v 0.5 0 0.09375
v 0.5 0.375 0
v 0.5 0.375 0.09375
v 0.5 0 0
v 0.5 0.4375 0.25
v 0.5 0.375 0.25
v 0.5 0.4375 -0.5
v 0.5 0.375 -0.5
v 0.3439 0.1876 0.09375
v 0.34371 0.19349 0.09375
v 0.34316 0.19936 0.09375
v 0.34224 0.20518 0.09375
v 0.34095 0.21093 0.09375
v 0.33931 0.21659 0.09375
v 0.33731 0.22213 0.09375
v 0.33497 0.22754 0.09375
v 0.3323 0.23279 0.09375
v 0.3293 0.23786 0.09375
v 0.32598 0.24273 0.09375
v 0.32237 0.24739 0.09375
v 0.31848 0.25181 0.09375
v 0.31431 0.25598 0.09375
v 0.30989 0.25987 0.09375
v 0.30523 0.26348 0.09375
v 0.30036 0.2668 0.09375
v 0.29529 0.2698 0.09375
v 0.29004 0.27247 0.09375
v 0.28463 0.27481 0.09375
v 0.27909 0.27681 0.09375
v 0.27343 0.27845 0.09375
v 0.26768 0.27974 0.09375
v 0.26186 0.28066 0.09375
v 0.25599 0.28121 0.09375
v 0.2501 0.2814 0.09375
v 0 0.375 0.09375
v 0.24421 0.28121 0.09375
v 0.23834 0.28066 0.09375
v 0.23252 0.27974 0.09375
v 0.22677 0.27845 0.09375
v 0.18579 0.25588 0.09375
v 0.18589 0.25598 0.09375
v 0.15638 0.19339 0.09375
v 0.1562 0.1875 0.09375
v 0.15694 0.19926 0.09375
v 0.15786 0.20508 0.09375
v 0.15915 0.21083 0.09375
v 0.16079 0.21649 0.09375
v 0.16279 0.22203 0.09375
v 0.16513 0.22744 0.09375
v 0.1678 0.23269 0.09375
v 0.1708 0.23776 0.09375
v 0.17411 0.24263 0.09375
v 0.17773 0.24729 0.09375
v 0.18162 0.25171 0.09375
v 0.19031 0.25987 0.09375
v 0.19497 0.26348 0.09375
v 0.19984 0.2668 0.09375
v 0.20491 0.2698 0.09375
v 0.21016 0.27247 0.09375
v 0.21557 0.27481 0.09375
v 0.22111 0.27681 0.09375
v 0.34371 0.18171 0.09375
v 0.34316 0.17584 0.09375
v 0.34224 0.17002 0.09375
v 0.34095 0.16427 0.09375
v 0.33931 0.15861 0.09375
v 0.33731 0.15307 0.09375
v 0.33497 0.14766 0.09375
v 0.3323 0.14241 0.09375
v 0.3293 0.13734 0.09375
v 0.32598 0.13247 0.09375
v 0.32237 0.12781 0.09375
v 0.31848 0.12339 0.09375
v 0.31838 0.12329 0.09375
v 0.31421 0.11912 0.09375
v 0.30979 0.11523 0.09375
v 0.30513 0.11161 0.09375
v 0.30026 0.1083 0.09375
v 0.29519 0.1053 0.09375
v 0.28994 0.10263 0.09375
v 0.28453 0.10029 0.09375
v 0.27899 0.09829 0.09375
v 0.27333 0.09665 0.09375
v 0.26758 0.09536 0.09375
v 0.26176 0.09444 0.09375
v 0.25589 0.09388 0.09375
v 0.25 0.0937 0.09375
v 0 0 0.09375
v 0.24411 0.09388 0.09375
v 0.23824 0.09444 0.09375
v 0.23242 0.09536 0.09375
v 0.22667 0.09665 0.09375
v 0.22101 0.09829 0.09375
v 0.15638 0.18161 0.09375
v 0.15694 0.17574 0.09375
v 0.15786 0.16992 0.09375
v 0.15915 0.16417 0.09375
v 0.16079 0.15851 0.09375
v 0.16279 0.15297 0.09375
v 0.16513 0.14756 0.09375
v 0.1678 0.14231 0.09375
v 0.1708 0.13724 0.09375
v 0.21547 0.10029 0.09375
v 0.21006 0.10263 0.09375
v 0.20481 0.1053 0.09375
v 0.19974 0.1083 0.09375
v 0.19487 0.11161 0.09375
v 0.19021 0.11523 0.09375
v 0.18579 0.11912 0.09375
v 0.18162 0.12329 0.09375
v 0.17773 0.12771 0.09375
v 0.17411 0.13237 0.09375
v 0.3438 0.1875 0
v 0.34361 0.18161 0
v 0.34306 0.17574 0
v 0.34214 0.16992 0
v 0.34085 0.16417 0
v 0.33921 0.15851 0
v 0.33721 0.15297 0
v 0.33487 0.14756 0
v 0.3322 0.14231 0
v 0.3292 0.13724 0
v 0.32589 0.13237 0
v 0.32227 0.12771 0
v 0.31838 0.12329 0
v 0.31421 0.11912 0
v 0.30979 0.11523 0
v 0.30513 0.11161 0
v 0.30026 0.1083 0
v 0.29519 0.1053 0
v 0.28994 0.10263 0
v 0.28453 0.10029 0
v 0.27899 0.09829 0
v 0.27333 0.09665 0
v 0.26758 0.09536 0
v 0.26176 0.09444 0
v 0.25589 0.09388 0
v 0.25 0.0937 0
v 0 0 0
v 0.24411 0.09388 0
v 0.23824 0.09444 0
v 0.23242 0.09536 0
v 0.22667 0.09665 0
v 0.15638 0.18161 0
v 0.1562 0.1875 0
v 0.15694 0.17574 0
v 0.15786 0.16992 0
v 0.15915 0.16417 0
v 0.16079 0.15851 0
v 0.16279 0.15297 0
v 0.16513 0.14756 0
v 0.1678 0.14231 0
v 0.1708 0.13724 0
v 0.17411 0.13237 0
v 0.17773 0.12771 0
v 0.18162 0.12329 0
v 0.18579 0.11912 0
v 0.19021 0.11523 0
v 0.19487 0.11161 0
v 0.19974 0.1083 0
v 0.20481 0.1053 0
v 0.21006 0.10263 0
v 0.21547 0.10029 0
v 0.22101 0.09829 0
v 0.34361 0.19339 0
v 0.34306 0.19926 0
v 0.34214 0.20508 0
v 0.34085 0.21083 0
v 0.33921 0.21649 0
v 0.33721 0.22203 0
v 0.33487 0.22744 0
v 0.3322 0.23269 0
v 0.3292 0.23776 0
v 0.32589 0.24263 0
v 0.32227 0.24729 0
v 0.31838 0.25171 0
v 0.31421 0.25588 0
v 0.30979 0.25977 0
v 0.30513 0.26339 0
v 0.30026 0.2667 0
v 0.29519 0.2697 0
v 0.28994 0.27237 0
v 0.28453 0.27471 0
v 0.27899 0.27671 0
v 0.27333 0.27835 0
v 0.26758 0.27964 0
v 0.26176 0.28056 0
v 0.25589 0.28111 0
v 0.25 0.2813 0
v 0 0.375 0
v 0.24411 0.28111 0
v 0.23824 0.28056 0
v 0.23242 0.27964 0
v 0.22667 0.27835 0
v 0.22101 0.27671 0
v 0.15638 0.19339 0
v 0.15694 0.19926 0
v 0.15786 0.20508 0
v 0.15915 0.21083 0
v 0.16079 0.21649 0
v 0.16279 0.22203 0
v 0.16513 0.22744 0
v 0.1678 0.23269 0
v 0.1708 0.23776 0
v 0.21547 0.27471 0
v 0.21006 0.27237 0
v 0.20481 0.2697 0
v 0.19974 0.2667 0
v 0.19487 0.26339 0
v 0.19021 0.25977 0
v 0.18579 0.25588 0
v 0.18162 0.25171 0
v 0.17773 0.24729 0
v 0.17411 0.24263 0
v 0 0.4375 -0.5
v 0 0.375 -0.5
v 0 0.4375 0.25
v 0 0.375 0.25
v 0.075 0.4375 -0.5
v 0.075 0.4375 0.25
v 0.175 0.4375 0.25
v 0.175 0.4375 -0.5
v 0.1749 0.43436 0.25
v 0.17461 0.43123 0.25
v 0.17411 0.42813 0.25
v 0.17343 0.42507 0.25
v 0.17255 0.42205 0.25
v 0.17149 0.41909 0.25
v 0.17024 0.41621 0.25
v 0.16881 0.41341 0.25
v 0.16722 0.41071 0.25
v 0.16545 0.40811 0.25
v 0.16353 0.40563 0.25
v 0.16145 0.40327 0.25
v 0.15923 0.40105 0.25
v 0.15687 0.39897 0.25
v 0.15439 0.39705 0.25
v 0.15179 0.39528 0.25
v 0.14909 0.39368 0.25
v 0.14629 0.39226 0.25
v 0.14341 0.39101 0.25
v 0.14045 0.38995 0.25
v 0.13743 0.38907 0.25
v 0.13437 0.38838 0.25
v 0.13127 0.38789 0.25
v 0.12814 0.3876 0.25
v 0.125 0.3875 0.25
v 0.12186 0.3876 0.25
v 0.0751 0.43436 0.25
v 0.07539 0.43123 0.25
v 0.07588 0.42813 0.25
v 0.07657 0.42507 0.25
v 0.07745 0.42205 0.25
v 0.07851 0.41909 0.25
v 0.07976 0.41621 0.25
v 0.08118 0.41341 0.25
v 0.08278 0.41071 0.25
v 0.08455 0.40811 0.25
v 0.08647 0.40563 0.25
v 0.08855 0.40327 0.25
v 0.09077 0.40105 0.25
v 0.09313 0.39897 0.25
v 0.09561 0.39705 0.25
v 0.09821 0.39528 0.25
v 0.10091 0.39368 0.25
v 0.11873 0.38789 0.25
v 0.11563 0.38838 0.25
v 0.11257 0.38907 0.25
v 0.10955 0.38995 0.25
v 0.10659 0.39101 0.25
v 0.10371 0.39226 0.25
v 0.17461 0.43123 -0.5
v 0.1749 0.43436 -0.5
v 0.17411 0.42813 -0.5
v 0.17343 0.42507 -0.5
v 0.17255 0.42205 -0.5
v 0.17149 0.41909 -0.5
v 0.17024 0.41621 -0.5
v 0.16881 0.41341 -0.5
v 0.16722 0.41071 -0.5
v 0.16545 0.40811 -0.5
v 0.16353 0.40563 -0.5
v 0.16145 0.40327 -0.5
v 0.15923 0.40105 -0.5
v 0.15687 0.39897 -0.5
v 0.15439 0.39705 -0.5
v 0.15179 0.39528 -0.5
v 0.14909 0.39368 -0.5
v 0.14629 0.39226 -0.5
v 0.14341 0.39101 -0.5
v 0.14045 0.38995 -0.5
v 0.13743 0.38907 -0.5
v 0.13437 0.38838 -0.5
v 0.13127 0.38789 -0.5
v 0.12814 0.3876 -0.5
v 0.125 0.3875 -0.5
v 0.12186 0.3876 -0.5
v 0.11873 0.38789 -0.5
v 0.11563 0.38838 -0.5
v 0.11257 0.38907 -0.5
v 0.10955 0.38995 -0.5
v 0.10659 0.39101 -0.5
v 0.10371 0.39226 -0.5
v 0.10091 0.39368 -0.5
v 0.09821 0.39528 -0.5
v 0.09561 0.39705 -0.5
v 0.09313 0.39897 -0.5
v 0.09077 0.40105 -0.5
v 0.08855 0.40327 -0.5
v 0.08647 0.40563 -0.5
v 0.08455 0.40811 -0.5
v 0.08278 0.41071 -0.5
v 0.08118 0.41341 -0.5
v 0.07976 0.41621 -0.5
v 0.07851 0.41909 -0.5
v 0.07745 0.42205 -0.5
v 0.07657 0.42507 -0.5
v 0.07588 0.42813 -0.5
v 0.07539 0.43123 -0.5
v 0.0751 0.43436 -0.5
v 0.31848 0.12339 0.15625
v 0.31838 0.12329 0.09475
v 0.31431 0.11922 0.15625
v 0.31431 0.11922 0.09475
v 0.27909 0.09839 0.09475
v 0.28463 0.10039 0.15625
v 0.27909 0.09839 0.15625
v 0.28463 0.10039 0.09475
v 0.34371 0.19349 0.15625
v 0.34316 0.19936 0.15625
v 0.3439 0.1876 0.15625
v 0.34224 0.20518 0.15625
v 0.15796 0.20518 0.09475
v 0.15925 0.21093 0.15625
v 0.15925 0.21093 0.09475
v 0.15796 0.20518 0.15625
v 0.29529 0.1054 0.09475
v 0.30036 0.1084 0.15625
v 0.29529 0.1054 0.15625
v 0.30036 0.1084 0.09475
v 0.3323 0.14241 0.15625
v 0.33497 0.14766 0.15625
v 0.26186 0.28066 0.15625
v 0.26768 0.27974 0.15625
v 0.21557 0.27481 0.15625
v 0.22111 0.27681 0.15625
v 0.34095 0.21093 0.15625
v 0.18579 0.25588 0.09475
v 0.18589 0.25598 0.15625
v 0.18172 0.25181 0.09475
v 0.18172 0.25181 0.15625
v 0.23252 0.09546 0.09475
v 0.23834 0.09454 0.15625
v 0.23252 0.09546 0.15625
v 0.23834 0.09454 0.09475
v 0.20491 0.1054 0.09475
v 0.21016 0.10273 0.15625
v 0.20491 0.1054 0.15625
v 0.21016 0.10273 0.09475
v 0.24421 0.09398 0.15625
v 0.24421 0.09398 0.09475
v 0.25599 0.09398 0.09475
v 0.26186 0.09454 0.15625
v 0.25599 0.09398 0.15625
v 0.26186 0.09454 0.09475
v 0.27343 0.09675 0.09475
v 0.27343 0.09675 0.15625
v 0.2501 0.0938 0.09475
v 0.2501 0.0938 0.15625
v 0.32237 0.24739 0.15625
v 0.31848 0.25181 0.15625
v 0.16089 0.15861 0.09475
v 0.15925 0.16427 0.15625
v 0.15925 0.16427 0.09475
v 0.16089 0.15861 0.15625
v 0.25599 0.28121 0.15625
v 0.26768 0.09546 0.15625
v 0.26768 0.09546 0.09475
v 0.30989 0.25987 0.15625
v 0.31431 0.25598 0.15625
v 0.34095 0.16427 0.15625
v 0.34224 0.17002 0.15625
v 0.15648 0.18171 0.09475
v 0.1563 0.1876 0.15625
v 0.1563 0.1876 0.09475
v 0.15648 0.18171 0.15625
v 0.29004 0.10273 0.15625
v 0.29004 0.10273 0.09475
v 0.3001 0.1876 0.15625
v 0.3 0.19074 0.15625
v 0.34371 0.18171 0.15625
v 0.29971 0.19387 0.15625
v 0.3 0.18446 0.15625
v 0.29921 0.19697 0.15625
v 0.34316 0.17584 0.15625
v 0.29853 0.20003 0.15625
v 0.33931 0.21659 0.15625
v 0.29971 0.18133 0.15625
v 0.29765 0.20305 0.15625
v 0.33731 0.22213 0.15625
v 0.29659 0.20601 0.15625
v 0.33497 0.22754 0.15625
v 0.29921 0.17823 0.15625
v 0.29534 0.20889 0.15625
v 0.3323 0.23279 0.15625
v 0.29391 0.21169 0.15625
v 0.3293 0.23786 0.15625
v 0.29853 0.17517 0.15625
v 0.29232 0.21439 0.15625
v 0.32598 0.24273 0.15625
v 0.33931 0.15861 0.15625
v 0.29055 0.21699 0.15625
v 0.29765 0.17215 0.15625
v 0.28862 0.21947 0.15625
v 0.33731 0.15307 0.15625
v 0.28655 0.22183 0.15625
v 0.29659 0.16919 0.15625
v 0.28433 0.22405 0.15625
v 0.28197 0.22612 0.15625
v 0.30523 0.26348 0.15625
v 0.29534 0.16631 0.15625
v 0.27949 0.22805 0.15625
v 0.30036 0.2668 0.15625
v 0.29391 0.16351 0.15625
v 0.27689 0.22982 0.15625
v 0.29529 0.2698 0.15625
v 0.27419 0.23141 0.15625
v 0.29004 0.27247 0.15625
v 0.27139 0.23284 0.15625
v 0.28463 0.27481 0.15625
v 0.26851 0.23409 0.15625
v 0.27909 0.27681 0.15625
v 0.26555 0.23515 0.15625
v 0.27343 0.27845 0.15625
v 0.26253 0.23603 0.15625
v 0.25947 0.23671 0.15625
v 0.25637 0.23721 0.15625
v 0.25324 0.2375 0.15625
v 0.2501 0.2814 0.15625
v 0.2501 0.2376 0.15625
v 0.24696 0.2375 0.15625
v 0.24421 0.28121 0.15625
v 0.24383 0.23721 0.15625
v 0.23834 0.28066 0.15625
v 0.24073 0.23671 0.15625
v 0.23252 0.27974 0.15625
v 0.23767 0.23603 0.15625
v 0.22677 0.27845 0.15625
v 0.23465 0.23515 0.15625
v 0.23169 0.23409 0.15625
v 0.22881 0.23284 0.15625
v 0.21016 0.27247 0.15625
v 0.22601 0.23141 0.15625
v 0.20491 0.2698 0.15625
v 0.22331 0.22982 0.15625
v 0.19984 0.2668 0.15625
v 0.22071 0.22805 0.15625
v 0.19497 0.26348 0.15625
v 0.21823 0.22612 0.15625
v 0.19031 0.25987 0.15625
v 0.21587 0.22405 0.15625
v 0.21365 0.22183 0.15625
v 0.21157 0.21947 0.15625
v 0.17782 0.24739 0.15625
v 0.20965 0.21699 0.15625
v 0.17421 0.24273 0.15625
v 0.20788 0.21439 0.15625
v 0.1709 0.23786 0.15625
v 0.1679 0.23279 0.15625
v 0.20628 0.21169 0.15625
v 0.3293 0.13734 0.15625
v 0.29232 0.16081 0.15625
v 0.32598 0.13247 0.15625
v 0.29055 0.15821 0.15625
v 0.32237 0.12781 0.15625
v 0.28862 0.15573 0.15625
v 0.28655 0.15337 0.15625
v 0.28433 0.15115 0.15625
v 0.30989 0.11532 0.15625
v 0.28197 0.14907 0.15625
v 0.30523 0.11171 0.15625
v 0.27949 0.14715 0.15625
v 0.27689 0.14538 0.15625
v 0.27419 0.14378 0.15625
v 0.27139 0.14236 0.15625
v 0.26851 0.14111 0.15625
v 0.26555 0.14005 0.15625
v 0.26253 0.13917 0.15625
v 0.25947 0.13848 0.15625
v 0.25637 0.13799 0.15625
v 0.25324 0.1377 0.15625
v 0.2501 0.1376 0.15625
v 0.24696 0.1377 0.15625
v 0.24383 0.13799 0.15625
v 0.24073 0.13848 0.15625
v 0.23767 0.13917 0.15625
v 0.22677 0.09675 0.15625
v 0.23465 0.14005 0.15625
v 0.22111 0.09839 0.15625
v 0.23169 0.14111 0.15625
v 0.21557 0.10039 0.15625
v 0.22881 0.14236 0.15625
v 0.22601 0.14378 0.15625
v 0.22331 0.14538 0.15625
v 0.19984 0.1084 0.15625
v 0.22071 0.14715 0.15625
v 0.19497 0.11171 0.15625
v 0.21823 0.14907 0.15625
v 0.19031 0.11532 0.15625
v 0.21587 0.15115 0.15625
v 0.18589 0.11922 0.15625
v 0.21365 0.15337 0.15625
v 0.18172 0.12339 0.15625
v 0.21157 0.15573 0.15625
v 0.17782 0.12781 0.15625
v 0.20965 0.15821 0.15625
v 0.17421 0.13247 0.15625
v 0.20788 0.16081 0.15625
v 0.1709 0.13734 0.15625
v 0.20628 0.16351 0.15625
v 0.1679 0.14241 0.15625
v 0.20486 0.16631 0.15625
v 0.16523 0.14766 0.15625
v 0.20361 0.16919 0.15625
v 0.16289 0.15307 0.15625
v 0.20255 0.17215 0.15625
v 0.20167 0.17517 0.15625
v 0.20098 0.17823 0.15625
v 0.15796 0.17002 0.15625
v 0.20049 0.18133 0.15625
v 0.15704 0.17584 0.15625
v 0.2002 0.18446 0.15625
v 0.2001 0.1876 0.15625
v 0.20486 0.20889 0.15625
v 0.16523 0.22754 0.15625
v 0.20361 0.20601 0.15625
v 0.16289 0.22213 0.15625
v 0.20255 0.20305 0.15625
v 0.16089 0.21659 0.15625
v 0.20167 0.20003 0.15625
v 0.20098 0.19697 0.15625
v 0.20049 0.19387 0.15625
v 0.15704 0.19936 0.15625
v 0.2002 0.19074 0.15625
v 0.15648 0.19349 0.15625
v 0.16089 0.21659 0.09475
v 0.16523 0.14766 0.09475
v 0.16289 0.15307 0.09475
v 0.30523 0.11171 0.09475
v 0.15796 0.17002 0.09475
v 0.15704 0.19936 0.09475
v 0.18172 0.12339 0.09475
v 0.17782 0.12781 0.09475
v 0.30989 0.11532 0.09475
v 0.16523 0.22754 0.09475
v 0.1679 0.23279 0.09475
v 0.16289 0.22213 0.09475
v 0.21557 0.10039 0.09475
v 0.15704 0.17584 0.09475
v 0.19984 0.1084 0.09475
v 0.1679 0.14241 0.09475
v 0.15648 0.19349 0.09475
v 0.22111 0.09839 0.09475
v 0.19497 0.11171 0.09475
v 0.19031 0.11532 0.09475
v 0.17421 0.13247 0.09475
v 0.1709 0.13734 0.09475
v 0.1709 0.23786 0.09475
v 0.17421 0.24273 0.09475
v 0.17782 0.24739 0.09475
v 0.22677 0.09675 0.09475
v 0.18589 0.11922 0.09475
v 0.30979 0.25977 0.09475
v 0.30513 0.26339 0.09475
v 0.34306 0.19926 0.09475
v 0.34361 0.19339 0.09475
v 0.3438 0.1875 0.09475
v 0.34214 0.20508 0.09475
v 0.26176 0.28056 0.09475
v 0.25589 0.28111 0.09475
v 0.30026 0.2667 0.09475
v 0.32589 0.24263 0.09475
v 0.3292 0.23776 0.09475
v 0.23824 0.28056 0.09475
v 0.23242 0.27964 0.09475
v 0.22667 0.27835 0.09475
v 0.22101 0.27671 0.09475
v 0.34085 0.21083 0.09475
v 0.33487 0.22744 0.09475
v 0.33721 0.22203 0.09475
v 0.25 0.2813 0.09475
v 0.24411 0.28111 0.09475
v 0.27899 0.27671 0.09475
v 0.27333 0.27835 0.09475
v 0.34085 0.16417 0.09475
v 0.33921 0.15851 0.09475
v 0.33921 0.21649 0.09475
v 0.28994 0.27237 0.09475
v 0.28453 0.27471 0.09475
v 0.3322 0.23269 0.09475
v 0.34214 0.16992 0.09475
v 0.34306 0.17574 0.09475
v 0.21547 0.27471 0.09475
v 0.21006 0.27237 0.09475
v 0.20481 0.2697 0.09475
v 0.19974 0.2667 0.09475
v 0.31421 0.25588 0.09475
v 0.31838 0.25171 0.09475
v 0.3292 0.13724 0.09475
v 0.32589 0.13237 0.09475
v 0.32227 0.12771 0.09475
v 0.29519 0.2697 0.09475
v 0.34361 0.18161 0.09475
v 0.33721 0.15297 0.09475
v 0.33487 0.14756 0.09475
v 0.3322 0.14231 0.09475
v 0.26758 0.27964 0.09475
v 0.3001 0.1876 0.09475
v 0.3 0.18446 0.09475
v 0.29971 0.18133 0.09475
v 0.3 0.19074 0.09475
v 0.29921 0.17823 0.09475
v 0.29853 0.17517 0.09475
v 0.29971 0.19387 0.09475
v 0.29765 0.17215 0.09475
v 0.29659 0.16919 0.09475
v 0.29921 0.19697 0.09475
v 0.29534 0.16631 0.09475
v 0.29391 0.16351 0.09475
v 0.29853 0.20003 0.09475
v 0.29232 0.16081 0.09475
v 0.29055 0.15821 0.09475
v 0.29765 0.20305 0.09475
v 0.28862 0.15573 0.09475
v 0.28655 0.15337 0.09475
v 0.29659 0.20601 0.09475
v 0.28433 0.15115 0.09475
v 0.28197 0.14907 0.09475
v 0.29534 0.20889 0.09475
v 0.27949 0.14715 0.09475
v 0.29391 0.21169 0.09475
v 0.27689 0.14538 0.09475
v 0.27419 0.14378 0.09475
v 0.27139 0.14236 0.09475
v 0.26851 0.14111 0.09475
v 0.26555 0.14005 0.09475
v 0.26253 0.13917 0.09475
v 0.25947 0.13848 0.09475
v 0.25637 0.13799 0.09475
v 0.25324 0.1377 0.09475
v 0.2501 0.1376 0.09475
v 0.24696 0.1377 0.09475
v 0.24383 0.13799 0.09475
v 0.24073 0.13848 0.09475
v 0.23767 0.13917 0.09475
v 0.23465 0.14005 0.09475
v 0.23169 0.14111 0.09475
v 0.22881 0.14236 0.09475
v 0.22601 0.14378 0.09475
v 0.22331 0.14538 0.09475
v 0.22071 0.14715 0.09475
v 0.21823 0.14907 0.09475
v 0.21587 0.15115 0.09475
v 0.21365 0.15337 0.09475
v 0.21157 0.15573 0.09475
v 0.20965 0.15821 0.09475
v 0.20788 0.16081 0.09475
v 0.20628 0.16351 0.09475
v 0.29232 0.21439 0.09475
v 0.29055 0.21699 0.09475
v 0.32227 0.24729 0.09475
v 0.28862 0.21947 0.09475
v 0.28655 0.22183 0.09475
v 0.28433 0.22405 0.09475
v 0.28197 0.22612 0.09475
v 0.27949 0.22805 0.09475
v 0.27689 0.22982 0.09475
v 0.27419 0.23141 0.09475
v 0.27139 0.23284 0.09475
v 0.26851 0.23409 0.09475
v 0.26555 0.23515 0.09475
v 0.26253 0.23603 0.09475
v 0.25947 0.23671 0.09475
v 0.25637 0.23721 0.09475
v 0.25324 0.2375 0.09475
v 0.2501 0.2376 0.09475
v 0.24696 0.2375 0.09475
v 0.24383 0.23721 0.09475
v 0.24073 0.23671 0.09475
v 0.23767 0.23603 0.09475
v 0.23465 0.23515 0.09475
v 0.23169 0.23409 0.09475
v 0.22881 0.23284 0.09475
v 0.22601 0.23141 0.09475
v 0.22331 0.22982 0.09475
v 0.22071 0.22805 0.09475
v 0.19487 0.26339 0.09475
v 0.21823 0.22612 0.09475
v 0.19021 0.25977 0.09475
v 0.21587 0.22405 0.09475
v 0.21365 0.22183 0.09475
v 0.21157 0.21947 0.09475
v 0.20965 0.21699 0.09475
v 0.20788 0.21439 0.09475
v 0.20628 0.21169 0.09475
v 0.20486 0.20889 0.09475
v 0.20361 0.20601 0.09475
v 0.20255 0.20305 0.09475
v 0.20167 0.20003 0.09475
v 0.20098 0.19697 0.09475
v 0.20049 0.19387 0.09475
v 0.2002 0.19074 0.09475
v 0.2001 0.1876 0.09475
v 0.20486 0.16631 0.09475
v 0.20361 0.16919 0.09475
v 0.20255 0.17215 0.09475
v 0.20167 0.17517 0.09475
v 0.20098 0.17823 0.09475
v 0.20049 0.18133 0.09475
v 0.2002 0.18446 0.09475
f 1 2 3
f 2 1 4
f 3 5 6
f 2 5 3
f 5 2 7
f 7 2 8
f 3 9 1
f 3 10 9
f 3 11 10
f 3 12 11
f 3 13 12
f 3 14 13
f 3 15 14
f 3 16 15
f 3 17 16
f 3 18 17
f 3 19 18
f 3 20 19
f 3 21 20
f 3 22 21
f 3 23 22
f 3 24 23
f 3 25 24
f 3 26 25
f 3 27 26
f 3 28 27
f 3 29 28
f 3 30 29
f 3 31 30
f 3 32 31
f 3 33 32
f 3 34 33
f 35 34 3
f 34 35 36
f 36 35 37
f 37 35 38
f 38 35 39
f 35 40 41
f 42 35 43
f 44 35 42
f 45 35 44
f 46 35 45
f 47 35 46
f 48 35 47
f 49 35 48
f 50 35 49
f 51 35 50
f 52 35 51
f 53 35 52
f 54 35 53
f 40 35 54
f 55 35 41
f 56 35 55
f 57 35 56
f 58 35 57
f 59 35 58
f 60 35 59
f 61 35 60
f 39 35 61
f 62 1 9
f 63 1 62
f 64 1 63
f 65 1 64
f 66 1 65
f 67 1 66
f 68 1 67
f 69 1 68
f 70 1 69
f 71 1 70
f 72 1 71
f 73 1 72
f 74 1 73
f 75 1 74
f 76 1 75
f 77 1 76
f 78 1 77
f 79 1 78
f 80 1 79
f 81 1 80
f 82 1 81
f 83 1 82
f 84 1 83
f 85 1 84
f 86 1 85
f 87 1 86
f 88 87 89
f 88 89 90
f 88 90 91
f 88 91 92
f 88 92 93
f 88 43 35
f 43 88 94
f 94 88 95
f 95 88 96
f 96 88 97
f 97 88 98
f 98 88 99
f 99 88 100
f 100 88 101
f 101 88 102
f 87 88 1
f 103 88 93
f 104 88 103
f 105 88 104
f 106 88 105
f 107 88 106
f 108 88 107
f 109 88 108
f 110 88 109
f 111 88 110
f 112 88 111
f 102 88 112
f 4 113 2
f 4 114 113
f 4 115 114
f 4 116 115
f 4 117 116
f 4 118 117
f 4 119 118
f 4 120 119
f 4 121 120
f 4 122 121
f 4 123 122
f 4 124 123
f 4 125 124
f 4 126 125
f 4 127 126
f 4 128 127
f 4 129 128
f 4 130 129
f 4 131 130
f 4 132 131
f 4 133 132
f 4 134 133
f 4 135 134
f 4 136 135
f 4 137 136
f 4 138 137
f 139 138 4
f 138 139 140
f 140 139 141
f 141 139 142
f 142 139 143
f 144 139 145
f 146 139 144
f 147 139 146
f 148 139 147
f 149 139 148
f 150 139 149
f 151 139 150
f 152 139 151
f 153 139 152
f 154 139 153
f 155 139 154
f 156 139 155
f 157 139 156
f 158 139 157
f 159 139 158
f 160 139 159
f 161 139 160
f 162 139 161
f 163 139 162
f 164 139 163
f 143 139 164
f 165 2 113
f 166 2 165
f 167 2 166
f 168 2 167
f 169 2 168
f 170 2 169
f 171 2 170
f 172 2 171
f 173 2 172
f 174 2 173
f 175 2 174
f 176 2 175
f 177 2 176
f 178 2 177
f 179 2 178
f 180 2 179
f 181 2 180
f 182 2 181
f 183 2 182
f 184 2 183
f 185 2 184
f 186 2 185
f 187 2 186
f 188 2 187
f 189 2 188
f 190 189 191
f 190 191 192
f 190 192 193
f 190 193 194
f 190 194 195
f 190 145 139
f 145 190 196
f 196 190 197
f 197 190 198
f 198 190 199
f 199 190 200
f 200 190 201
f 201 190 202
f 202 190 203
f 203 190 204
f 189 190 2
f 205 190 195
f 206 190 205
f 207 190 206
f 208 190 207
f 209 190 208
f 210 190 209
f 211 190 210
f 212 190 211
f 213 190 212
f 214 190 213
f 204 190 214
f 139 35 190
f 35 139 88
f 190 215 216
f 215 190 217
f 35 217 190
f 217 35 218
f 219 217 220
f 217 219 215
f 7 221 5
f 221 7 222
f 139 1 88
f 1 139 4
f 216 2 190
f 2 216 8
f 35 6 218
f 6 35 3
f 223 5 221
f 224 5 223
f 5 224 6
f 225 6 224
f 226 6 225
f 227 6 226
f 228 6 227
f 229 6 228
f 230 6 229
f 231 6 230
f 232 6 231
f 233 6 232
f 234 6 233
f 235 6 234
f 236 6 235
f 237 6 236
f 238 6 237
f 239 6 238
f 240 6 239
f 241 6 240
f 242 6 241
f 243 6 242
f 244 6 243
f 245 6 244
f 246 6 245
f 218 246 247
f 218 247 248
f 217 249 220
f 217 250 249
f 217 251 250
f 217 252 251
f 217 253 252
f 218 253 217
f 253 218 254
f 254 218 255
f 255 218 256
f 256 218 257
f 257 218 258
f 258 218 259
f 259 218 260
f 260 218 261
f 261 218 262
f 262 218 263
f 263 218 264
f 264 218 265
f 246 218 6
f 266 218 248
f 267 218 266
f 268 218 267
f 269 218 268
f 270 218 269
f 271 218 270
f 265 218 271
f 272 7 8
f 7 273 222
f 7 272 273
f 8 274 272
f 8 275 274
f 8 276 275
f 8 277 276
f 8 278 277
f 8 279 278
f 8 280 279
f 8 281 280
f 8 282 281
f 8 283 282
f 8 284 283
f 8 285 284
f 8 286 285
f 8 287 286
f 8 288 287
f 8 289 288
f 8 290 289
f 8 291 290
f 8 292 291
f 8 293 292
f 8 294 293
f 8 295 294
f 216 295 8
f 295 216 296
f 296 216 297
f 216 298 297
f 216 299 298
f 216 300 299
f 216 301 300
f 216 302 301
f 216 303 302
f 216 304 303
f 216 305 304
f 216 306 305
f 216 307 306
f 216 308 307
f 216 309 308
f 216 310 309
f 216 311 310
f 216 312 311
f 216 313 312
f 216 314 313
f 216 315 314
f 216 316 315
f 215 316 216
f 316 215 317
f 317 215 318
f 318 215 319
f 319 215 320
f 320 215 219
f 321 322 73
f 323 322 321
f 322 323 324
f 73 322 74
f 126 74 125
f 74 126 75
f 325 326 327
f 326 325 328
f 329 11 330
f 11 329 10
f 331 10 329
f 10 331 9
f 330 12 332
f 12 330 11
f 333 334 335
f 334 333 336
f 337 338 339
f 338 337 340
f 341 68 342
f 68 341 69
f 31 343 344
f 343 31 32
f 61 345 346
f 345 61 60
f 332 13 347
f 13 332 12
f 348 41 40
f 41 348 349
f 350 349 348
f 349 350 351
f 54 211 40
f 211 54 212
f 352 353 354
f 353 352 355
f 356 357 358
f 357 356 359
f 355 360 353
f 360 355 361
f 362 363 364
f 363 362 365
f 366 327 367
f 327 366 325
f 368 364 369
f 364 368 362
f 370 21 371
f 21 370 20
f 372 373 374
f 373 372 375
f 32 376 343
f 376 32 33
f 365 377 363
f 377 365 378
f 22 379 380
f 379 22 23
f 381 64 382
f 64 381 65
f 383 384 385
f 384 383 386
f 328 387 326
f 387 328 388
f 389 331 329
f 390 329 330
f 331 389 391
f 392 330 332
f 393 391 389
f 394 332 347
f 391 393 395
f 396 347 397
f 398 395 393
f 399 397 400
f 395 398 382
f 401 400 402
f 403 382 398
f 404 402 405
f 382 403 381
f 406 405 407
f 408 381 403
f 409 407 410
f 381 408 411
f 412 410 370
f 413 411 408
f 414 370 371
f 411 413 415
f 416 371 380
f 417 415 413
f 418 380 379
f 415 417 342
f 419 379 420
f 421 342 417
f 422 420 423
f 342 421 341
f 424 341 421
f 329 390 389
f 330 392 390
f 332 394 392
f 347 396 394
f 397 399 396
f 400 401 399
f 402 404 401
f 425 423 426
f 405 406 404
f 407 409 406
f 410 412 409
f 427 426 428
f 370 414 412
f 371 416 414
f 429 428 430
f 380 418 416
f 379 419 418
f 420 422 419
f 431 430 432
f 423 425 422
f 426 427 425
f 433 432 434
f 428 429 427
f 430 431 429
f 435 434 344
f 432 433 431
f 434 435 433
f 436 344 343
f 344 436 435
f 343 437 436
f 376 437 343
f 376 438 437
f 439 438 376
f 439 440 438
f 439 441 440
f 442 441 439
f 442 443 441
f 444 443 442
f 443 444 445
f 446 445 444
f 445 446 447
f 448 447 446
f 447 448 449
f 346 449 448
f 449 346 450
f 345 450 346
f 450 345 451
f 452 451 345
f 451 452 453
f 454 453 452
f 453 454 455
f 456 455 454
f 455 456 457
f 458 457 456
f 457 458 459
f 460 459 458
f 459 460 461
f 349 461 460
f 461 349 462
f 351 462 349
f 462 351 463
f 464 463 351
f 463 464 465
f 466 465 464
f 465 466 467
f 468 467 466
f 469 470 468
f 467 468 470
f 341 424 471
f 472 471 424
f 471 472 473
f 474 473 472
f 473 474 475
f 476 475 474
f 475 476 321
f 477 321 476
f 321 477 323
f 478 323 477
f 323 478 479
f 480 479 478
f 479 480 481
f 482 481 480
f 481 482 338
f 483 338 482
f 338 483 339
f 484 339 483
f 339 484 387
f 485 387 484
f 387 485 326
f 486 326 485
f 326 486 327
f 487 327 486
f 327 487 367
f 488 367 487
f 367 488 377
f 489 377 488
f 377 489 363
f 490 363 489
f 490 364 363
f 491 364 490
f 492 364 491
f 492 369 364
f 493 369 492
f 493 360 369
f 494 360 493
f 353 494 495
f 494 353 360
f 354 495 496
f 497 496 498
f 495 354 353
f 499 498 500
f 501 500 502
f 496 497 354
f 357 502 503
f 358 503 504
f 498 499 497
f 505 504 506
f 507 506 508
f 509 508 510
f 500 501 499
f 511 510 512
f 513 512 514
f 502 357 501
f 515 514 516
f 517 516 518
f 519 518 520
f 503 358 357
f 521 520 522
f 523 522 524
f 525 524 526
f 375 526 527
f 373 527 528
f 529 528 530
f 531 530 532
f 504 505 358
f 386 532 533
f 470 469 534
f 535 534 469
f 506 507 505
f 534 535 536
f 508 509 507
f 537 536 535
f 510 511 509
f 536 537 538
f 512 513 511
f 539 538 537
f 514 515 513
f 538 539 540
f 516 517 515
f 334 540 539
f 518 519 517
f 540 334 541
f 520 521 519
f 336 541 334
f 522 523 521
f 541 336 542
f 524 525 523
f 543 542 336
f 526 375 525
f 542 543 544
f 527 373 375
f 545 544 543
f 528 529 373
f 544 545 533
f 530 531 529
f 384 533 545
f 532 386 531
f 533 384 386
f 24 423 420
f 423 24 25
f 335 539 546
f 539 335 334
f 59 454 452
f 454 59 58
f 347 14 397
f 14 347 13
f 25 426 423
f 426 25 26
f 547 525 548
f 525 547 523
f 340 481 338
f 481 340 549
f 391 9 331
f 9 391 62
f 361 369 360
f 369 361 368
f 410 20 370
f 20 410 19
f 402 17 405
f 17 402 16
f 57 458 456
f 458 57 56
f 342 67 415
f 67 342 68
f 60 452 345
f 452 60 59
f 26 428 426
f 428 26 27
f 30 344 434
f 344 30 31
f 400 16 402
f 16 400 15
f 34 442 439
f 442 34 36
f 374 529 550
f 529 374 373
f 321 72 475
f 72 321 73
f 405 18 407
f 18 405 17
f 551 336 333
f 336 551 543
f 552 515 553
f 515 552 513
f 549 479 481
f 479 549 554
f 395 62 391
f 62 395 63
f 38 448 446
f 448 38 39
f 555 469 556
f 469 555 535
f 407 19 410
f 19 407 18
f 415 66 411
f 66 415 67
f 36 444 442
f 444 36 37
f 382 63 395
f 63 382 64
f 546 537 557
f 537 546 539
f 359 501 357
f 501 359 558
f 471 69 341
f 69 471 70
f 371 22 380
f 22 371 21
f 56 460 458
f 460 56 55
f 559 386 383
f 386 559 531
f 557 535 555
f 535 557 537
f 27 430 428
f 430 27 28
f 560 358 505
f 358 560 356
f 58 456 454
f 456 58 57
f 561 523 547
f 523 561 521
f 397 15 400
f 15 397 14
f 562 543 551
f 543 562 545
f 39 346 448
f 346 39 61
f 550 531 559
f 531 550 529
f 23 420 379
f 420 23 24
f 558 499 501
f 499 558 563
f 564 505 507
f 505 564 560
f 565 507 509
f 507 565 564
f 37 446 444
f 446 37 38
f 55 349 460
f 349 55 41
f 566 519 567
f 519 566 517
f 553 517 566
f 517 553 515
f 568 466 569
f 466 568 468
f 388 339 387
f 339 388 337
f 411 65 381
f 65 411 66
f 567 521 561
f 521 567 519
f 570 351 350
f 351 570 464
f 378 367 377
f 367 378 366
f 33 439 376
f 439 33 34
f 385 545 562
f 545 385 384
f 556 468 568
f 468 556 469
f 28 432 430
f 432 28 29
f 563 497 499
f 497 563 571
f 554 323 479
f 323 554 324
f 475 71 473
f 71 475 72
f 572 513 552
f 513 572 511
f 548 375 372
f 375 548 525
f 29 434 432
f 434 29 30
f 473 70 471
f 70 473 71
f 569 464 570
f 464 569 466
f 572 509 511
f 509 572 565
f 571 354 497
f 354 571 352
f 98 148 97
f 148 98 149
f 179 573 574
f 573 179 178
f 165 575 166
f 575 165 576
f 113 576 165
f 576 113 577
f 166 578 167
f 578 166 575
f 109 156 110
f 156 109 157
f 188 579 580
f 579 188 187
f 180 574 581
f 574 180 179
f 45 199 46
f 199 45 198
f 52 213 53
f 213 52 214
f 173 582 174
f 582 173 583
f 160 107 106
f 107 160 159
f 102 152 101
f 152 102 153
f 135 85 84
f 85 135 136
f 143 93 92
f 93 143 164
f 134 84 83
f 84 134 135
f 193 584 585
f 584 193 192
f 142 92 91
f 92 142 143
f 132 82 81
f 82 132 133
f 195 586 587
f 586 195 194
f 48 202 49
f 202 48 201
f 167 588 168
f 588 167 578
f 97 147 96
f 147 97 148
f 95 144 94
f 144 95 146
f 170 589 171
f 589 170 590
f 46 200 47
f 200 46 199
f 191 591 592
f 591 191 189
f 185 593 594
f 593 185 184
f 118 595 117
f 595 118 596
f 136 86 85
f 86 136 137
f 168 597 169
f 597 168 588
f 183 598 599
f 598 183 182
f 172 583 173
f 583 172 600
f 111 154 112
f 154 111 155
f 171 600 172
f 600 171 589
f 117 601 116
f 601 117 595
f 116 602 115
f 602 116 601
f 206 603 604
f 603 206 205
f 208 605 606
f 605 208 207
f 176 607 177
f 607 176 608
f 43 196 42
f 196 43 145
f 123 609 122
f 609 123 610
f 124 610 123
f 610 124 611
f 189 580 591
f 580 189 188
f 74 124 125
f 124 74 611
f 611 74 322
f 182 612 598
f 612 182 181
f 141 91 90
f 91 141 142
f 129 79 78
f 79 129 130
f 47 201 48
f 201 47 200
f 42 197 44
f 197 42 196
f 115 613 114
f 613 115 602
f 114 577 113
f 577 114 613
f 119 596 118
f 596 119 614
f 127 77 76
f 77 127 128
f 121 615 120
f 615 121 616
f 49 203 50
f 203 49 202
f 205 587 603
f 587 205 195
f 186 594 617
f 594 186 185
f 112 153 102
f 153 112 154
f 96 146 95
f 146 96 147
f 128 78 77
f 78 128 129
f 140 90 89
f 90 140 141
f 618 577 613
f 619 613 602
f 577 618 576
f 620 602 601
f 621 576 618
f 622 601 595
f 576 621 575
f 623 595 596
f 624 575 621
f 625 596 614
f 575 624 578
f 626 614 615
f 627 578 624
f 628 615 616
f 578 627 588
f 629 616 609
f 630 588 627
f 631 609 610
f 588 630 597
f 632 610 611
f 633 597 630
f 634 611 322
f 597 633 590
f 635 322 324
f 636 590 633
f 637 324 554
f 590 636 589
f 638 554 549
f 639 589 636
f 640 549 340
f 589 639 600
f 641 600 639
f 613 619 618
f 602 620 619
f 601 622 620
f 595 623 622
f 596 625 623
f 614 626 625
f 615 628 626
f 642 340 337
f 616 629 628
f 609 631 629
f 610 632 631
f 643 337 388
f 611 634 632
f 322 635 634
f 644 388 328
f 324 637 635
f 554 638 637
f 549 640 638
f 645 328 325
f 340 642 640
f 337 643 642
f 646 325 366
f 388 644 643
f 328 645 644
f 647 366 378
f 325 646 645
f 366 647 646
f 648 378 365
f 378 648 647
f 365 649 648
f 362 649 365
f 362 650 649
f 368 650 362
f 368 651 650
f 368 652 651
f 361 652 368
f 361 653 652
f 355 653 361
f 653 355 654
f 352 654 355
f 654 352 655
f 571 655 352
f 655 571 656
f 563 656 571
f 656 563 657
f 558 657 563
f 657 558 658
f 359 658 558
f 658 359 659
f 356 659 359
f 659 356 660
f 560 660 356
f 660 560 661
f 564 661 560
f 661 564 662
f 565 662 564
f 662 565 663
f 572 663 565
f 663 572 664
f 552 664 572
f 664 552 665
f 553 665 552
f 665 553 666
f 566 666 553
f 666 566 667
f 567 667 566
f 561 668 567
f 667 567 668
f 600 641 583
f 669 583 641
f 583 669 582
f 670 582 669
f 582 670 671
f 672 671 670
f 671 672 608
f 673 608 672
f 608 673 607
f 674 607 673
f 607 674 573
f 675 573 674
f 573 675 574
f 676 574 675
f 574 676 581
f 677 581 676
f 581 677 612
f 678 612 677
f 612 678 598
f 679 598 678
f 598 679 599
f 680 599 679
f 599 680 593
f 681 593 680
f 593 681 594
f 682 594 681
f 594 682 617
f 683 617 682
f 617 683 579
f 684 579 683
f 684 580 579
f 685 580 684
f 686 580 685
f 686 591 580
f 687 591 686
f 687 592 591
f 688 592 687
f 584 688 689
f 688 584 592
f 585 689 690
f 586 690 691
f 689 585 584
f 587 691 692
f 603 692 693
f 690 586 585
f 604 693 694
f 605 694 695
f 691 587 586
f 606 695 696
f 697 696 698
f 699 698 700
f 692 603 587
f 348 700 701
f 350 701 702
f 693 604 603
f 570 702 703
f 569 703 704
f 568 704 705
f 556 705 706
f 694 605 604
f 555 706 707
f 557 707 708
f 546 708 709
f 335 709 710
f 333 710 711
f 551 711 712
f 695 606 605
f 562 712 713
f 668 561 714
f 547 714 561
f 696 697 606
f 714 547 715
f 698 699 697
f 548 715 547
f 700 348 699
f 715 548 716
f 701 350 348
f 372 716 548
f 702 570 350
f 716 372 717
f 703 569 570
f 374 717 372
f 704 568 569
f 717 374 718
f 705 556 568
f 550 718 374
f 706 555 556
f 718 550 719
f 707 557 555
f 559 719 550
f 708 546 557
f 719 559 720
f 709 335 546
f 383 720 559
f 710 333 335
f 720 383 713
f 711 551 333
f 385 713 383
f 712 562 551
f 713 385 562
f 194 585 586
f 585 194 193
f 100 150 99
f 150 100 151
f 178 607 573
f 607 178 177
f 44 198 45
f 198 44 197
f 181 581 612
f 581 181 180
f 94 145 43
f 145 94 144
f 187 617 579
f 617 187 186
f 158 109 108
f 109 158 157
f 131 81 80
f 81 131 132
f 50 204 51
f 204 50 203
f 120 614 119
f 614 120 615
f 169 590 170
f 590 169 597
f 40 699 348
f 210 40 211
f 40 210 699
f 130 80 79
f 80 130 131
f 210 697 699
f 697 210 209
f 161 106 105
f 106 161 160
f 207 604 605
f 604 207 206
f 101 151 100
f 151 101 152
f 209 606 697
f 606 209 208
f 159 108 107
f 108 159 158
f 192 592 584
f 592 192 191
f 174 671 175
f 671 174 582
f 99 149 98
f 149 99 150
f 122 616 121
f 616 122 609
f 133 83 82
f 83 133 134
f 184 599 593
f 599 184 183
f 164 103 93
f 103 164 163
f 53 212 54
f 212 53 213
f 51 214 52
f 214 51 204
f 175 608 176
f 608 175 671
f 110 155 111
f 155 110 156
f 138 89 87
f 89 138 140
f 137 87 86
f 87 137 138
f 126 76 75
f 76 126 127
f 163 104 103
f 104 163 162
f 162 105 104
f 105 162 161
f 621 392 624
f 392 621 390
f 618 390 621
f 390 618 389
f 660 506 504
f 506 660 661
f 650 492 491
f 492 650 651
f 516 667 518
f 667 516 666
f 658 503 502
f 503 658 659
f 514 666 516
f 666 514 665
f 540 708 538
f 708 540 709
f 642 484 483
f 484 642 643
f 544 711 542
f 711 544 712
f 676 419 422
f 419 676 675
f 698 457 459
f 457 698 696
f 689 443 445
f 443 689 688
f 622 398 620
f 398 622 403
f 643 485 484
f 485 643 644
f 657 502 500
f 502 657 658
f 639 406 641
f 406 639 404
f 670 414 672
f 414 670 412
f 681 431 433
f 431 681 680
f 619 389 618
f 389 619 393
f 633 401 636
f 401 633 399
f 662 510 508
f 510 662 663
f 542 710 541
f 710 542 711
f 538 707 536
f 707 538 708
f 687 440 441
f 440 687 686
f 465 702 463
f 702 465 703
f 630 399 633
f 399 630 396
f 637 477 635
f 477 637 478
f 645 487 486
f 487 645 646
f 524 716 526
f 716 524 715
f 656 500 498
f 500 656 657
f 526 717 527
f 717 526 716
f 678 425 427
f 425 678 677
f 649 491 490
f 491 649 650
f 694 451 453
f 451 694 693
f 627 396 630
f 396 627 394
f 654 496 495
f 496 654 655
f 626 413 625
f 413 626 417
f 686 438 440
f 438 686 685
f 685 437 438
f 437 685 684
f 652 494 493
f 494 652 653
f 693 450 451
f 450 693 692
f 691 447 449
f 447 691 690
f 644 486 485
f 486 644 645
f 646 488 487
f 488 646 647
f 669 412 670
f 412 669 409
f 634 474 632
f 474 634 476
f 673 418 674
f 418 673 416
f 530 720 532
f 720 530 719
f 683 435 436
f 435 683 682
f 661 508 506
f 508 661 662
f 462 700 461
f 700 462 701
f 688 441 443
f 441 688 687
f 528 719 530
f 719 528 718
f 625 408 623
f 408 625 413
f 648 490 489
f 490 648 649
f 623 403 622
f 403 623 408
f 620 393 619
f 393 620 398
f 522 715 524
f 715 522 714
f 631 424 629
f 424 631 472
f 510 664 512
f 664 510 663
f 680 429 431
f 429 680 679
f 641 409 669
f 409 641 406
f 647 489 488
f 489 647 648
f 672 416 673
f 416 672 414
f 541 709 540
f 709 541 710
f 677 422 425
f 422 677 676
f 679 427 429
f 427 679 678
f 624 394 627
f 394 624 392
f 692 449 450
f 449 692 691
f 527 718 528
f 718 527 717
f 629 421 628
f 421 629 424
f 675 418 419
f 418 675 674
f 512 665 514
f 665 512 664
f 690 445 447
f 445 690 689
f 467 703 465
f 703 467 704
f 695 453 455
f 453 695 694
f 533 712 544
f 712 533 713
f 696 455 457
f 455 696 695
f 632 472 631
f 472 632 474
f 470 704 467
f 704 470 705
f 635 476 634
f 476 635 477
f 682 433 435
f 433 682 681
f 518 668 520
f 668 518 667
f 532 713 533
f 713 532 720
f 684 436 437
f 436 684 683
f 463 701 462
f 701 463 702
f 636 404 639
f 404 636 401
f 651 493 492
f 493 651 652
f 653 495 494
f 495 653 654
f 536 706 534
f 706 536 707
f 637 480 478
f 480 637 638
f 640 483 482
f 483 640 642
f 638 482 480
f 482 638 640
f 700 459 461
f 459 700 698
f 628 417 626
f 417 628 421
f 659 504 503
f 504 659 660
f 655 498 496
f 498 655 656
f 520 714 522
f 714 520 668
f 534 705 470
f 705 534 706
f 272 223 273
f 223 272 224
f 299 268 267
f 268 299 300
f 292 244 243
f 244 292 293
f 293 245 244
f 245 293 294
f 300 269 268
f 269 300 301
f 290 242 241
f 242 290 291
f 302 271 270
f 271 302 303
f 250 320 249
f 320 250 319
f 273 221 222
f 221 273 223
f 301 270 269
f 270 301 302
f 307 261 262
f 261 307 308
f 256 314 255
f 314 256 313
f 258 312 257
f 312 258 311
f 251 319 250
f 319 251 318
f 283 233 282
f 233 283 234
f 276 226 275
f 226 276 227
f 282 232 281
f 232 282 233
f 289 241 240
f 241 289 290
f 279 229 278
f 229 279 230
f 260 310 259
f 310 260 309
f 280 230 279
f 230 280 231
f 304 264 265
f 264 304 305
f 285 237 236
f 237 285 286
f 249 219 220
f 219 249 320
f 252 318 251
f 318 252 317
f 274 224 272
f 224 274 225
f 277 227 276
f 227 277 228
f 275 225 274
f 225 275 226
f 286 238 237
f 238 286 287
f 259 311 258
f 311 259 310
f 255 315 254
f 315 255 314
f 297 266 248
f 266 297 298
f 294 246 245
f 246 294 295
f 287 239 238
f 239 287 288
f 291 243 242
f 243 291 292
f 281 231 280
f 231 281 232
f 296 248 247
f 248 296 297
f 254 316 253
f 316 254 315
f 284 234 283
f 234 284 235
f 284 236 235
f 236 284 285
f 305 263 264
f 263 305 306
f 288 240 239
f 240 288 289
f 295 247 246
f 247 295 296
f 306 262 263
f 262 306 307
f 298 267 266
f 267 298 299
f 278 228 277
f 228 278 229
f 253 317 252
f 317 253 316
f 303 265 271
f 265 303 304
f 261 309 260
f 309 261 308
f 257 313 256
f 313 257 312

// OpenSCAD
// Resolution for smooth curved surfaces
$fn = 100;

// Small epsilon value for clean boolean operations (prevents z-fighting)
eps = 0.001;

// --- Parameters ---

// Main Base Dimensions
base_length = 0.5;
base_width = 0.4375;
base_height = 0.09375;

// Main Base Void
base_void_x = 0.25;
base_void_y = 0.1875;
base_void_r = 0.0938;

// Back-edge Solids Footprint
back_solid_length = 0.5;
back_solid_width = 0.0625;
back_solid_y_offset = 0.375;

// Underside Strip Z-span
under_strip_z_min = -0.25;
under_strip_z_max = 0;

// Main Back-edge Solid Z-span
back_solid_z_min = -0.5;
back_solid_z_max = 0.25;

// Back-edge Void (Semi-circular notch on the back face)
back_void_x = 0.125;
back_void_y = 0.4375;
back_void_r = 0.05;

// Upper Concentric Annular Collar
collar_x = 0.2501;
collar_y = 0.1876;
collar_outer_r = 0.0938;
collar_inner_r = 0.05;
collar_height = 0.0625;


// --- Geometry ---

difference() {
    // 1. Positive Geometry (Additive)
    union() {
        // Main rectangular base
        cube([base_length, base_width, base_height]);
        
        // Underside solid strip along the back edge
        translate([0, back_solid_y_offset, under_strip_z_min])
            cube([back_solid_length, back_solid_width, under_strip_z_max - under_strip_z_min]);
            
        // Other back-edge solid (overlaps and extends the underside strip)
        translate([0, back_solid_y_offset, back_solid_z_min])
            cube([back_solid_length, back_solid_width, back_solid_z_max - back_solid_z_min]);
            
        // Upper concentric annular collar (outer solid boundary)
        translate([collar_x, collar_y, base_height])
            cylinder(h=collar_height, r=collar_outer_r);
    }
    
    // 2. Negative Geometry (Subtractive)
    
    // Main base circular void
    translate([base_void_x, base_void_y, -eps])
        cylinder(h=base_height + 2*eps, r=base_void_r);
        
    // Collar inner circular void
    translate([collar_x, collar_y, base_height - eps])
        cylinder(h=collar_height + 2*eps, r=collar_inner_r);
        
    // Back-edge solid circular void (coincident profile cutting through the back edge)
    translate([back_void_x, back_void_y, back_solid_z_min - eps])
        cylinder(h=(back_solid_z_max - back_solid_z_min) + 2*eps, r=back_void_r);
}
